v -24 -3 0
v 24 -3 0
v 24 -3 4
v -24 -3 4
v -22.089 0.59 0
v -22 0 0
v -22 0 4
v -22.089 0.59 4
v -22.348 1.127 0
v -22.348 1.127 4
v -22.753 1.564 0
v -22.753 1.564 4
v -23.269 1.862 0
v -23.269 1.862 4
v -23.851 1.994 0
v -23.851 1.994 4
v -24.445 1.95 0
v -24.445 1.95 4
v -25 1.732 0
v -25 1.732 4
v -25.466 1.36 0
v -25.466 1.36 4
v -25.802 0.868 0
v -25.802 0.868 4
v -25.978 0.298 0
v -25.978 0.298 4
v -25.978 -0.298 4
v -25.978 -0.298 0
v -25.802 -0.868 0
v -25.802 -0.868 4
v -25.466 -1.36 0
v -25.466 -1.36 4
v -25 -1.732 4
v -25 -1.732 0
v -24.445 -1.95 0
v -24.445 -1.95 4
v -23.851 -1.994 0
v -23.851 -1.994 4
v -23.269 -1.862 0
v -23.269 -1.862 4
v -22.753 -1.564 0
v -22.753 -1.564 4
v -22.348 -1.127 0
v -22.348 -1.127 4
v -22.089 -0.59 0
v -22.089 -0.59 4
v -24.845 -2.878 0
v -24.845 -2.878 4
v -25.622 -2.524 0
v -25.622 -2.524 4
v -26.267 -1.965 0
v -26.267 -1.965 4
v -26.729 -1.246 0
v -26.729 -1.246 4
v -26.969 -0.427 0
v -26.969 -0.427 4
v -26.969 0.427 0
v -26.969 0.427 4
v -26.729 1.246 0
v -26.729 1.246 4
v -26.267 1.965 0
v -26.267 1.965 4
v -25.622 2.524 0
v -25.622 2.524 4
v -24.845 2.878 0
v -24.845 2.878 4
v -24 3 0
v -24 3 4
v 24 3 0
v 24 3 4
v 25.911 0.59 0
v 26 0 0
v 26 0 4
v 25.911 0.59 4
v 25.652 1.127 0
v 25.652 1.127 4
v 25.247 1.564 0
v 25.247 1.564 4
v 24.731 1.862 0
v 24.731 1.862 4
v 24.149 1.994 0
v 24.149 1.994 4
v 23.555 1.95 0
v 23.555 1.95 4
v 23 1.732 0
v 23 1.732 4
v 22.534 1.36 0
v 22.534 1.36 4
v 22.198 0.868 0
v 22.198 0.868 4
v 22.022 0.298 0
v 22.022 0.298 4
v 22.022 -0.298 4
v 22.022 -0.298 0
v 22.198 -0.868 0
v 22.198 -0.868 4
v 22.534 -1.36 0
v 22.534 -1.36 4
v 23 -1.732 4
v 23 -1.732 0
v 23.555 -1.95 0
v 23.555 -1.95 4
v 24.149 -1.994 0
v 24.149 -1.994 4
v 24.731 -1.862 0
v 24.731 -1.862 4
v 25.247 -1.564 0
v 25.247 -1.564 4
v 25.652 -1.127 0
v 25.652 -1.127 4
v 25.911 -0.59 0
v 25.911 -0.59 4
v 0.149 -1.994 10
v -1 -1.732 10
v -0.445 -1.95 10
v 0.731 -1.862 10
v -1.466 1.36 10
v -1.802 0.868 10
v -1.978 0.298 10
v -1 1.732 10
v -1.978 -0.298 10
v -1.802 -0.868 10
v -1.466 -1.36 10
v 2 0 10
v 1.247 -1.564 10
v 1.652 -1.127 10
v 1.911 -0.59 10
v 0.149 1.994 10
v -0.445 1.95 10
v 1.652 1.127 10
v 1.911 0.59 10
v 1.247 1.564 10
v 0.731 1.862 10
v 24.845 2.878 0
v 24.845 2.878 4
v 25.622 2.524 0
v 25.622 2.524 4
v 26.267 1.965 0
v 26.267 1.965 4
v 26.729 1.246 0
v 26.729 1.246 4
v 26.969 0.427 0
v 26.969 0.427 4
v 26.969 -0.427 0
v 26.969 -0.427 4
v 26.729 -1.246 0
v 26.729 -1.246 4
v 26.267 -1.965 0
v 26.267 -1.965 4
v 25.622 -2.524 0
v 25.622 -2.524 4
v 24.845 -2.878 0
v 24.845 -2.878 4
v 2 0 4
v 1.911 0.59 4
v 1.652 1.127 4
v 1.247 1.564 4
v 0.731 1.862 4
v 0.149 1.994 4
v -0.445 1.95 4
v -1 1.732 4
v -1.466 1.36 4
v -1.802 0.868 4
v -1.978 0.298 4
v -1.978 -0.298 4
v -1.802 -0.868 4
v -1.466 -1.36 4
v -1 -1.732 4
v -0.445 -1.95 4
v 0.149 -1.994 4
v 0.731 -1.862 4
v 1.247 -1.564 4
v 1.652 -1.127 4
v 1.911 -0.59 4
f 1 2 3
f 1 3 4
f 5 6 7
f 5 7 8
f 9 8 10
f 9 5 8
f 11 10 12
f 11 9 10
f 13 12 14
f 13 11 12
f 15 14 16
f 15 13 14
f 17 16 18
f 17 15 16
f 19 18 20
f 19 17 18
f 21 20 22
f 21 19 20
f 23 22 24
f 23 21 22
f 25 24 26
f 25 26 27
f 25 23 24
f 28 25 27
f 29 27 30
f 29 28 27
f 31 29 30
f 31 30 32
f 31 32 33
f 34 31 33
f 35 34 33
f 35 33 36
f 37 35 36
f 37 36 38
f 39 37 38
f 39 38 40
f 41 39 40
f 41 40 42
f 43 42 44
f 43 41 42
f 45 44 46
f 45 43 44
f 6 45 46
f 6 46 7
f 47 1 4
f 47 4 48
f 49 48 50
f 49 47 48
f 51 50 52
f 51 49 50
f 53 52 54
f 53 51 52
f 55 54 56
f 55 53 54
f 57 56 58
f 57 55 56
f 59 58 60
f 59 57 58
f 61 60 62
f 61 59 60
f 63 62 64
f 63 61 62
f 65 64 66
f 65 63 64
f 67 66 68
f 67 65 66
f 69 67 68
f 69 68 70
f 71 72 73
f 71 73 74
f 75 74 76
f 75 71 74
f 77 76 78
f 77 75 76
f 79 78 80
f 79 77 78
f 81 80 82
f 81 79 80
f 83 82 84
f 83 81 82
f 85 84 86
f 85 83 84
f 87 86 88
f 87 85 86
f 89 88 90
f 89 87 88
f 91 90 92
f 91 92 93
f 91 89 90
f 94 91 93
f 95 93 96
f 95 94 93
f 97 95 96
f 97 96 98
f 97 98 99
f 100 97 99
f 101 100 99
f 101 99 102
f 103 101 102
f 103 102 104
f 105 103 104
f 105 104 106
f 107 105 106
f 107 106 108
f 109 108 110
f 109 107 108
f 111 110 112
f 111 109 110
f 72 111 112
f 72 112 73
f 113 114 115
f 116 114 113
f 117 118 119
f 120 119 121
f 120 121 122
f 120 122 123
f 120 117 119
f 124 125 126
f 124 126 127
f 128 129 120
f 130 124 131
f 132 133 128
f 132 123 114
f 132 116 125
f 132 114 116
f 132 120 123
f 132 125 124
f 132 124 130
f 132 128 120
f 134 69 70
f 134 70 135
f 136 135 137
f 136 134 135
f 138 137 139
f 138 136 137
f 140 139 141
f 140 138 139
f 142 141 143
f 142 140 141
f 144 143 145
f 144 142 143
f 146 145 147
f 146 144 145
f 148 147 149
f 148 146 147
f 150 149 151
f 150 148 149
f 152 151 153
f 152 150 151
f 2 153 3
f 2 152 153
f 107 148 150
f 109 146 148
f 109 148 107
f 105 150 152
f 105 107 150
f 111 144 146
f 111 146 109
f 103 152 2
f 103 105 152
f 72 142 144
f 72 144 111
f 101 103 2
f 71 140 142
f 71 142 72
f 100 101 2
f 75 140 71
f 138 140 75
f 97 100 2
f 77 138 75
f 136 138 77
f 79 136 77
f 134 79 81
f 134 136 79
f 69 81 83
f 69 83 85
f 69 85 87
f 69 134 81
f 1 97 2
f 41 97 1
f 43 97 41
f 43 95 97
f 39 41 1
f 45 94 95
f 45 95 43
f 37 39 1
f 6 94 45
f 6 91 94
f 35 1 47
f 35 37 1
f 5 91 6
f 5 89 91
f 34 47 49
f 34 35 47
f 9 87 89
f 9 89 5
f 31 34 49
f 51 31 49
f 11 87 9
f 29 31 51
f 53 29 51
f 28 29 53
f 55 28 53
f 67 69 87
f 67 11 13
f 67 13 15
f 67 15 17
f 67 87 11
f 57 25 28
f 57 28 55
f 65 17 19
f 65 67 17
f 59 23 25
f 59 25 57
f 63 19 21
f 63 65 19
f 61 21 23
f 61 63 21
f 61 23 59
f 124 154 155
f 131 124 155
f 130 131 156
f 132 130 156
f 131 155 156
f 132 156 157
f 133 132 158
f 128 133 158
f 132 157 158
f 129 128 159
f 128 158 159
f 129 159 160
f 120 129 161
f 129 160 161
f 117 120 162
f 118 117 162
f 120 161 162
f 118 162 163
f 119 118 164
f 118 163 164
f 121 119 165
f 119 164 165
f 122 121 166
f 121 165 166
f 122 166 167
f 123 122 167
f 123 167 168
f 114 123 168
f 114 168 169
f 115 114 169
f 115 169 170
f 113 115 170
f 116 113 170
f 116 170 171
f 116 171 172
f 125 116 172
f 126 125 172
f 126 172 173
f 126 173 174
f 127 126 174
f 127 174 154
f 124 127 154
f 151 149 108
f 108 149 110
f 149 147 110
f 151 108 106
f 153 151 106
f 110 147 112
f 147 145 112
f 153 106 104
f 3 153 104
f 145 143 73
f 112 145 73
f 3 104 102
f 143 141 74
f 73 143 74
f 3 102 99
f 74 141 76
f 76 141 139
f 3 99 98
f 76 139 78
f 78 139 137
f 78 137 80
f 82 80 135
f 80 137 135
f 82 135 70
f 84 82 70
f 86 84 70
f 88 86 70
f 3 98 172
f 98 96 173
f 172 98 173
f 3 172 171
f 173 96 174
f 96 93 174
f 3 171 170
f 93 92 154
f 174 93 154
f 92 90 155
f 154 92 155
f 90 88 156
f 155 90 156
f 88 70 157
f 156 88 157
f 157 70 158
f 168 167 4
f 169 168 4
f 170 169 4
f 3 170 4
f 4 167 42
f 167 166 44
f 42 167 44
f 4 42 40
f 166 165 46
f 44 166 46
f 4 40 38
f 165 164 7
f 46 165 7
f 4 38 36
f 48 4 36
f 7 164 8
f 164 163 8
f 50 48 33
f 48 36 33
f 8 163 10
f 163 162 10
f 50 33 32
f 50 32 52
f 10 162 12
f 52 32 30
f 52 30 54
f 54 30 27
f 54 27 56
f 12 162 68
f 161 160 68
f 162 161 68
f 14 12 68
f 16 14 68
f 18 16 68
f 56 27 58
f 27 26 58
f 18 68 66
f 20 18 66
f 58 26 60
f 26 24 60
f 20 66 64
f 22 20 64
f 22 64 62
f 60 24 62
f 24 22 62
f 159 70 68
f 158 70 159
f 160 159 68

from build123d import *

# Parameters (mm, degrees)
SKETCH1_R           = 2
BOSS_EXTRUDE2_DEPTH = 4
SKETCH1_2_R         = 2
BOSS_EXTRUDE3_DEPTH = 10


with BuildPart() as part:
    # Sketch1 → Boss-Extrude2 (new body)
    with BuildSketch(Plane.XY):
        with BuildLine():
            Line((-24, 3), (24, 3))
            ThreePointArc((24, 3), (27, 0), (24, -3))
            Line((24, -3), (-24, -3))
            ThreePointArc((-24, -3), (-27, 0), (-24, 3))
        make_face()
        with Locations((-24, 0)):
            Circle(SKETCH1_R, mode=Mode.SUBTRACT)
        with Locations((24, 0)):
            Circle(SKETCH1_R, mode=Mode.SUBTRACT)
        Circle(SKETCH1_R, mode=Mode.SUBTRACT)
    extrude(amount=BOSS_EXTRUDE2_DEPTH)

    # Sketch1<2> → Boss-Extrude3 (add)
    with BuildSketch(Plane.XY):
        Circle(SKETCH1_2_R)
    extrude(amount=BOSS_EXTRUDE3_DEPTH)


solid = part.part
